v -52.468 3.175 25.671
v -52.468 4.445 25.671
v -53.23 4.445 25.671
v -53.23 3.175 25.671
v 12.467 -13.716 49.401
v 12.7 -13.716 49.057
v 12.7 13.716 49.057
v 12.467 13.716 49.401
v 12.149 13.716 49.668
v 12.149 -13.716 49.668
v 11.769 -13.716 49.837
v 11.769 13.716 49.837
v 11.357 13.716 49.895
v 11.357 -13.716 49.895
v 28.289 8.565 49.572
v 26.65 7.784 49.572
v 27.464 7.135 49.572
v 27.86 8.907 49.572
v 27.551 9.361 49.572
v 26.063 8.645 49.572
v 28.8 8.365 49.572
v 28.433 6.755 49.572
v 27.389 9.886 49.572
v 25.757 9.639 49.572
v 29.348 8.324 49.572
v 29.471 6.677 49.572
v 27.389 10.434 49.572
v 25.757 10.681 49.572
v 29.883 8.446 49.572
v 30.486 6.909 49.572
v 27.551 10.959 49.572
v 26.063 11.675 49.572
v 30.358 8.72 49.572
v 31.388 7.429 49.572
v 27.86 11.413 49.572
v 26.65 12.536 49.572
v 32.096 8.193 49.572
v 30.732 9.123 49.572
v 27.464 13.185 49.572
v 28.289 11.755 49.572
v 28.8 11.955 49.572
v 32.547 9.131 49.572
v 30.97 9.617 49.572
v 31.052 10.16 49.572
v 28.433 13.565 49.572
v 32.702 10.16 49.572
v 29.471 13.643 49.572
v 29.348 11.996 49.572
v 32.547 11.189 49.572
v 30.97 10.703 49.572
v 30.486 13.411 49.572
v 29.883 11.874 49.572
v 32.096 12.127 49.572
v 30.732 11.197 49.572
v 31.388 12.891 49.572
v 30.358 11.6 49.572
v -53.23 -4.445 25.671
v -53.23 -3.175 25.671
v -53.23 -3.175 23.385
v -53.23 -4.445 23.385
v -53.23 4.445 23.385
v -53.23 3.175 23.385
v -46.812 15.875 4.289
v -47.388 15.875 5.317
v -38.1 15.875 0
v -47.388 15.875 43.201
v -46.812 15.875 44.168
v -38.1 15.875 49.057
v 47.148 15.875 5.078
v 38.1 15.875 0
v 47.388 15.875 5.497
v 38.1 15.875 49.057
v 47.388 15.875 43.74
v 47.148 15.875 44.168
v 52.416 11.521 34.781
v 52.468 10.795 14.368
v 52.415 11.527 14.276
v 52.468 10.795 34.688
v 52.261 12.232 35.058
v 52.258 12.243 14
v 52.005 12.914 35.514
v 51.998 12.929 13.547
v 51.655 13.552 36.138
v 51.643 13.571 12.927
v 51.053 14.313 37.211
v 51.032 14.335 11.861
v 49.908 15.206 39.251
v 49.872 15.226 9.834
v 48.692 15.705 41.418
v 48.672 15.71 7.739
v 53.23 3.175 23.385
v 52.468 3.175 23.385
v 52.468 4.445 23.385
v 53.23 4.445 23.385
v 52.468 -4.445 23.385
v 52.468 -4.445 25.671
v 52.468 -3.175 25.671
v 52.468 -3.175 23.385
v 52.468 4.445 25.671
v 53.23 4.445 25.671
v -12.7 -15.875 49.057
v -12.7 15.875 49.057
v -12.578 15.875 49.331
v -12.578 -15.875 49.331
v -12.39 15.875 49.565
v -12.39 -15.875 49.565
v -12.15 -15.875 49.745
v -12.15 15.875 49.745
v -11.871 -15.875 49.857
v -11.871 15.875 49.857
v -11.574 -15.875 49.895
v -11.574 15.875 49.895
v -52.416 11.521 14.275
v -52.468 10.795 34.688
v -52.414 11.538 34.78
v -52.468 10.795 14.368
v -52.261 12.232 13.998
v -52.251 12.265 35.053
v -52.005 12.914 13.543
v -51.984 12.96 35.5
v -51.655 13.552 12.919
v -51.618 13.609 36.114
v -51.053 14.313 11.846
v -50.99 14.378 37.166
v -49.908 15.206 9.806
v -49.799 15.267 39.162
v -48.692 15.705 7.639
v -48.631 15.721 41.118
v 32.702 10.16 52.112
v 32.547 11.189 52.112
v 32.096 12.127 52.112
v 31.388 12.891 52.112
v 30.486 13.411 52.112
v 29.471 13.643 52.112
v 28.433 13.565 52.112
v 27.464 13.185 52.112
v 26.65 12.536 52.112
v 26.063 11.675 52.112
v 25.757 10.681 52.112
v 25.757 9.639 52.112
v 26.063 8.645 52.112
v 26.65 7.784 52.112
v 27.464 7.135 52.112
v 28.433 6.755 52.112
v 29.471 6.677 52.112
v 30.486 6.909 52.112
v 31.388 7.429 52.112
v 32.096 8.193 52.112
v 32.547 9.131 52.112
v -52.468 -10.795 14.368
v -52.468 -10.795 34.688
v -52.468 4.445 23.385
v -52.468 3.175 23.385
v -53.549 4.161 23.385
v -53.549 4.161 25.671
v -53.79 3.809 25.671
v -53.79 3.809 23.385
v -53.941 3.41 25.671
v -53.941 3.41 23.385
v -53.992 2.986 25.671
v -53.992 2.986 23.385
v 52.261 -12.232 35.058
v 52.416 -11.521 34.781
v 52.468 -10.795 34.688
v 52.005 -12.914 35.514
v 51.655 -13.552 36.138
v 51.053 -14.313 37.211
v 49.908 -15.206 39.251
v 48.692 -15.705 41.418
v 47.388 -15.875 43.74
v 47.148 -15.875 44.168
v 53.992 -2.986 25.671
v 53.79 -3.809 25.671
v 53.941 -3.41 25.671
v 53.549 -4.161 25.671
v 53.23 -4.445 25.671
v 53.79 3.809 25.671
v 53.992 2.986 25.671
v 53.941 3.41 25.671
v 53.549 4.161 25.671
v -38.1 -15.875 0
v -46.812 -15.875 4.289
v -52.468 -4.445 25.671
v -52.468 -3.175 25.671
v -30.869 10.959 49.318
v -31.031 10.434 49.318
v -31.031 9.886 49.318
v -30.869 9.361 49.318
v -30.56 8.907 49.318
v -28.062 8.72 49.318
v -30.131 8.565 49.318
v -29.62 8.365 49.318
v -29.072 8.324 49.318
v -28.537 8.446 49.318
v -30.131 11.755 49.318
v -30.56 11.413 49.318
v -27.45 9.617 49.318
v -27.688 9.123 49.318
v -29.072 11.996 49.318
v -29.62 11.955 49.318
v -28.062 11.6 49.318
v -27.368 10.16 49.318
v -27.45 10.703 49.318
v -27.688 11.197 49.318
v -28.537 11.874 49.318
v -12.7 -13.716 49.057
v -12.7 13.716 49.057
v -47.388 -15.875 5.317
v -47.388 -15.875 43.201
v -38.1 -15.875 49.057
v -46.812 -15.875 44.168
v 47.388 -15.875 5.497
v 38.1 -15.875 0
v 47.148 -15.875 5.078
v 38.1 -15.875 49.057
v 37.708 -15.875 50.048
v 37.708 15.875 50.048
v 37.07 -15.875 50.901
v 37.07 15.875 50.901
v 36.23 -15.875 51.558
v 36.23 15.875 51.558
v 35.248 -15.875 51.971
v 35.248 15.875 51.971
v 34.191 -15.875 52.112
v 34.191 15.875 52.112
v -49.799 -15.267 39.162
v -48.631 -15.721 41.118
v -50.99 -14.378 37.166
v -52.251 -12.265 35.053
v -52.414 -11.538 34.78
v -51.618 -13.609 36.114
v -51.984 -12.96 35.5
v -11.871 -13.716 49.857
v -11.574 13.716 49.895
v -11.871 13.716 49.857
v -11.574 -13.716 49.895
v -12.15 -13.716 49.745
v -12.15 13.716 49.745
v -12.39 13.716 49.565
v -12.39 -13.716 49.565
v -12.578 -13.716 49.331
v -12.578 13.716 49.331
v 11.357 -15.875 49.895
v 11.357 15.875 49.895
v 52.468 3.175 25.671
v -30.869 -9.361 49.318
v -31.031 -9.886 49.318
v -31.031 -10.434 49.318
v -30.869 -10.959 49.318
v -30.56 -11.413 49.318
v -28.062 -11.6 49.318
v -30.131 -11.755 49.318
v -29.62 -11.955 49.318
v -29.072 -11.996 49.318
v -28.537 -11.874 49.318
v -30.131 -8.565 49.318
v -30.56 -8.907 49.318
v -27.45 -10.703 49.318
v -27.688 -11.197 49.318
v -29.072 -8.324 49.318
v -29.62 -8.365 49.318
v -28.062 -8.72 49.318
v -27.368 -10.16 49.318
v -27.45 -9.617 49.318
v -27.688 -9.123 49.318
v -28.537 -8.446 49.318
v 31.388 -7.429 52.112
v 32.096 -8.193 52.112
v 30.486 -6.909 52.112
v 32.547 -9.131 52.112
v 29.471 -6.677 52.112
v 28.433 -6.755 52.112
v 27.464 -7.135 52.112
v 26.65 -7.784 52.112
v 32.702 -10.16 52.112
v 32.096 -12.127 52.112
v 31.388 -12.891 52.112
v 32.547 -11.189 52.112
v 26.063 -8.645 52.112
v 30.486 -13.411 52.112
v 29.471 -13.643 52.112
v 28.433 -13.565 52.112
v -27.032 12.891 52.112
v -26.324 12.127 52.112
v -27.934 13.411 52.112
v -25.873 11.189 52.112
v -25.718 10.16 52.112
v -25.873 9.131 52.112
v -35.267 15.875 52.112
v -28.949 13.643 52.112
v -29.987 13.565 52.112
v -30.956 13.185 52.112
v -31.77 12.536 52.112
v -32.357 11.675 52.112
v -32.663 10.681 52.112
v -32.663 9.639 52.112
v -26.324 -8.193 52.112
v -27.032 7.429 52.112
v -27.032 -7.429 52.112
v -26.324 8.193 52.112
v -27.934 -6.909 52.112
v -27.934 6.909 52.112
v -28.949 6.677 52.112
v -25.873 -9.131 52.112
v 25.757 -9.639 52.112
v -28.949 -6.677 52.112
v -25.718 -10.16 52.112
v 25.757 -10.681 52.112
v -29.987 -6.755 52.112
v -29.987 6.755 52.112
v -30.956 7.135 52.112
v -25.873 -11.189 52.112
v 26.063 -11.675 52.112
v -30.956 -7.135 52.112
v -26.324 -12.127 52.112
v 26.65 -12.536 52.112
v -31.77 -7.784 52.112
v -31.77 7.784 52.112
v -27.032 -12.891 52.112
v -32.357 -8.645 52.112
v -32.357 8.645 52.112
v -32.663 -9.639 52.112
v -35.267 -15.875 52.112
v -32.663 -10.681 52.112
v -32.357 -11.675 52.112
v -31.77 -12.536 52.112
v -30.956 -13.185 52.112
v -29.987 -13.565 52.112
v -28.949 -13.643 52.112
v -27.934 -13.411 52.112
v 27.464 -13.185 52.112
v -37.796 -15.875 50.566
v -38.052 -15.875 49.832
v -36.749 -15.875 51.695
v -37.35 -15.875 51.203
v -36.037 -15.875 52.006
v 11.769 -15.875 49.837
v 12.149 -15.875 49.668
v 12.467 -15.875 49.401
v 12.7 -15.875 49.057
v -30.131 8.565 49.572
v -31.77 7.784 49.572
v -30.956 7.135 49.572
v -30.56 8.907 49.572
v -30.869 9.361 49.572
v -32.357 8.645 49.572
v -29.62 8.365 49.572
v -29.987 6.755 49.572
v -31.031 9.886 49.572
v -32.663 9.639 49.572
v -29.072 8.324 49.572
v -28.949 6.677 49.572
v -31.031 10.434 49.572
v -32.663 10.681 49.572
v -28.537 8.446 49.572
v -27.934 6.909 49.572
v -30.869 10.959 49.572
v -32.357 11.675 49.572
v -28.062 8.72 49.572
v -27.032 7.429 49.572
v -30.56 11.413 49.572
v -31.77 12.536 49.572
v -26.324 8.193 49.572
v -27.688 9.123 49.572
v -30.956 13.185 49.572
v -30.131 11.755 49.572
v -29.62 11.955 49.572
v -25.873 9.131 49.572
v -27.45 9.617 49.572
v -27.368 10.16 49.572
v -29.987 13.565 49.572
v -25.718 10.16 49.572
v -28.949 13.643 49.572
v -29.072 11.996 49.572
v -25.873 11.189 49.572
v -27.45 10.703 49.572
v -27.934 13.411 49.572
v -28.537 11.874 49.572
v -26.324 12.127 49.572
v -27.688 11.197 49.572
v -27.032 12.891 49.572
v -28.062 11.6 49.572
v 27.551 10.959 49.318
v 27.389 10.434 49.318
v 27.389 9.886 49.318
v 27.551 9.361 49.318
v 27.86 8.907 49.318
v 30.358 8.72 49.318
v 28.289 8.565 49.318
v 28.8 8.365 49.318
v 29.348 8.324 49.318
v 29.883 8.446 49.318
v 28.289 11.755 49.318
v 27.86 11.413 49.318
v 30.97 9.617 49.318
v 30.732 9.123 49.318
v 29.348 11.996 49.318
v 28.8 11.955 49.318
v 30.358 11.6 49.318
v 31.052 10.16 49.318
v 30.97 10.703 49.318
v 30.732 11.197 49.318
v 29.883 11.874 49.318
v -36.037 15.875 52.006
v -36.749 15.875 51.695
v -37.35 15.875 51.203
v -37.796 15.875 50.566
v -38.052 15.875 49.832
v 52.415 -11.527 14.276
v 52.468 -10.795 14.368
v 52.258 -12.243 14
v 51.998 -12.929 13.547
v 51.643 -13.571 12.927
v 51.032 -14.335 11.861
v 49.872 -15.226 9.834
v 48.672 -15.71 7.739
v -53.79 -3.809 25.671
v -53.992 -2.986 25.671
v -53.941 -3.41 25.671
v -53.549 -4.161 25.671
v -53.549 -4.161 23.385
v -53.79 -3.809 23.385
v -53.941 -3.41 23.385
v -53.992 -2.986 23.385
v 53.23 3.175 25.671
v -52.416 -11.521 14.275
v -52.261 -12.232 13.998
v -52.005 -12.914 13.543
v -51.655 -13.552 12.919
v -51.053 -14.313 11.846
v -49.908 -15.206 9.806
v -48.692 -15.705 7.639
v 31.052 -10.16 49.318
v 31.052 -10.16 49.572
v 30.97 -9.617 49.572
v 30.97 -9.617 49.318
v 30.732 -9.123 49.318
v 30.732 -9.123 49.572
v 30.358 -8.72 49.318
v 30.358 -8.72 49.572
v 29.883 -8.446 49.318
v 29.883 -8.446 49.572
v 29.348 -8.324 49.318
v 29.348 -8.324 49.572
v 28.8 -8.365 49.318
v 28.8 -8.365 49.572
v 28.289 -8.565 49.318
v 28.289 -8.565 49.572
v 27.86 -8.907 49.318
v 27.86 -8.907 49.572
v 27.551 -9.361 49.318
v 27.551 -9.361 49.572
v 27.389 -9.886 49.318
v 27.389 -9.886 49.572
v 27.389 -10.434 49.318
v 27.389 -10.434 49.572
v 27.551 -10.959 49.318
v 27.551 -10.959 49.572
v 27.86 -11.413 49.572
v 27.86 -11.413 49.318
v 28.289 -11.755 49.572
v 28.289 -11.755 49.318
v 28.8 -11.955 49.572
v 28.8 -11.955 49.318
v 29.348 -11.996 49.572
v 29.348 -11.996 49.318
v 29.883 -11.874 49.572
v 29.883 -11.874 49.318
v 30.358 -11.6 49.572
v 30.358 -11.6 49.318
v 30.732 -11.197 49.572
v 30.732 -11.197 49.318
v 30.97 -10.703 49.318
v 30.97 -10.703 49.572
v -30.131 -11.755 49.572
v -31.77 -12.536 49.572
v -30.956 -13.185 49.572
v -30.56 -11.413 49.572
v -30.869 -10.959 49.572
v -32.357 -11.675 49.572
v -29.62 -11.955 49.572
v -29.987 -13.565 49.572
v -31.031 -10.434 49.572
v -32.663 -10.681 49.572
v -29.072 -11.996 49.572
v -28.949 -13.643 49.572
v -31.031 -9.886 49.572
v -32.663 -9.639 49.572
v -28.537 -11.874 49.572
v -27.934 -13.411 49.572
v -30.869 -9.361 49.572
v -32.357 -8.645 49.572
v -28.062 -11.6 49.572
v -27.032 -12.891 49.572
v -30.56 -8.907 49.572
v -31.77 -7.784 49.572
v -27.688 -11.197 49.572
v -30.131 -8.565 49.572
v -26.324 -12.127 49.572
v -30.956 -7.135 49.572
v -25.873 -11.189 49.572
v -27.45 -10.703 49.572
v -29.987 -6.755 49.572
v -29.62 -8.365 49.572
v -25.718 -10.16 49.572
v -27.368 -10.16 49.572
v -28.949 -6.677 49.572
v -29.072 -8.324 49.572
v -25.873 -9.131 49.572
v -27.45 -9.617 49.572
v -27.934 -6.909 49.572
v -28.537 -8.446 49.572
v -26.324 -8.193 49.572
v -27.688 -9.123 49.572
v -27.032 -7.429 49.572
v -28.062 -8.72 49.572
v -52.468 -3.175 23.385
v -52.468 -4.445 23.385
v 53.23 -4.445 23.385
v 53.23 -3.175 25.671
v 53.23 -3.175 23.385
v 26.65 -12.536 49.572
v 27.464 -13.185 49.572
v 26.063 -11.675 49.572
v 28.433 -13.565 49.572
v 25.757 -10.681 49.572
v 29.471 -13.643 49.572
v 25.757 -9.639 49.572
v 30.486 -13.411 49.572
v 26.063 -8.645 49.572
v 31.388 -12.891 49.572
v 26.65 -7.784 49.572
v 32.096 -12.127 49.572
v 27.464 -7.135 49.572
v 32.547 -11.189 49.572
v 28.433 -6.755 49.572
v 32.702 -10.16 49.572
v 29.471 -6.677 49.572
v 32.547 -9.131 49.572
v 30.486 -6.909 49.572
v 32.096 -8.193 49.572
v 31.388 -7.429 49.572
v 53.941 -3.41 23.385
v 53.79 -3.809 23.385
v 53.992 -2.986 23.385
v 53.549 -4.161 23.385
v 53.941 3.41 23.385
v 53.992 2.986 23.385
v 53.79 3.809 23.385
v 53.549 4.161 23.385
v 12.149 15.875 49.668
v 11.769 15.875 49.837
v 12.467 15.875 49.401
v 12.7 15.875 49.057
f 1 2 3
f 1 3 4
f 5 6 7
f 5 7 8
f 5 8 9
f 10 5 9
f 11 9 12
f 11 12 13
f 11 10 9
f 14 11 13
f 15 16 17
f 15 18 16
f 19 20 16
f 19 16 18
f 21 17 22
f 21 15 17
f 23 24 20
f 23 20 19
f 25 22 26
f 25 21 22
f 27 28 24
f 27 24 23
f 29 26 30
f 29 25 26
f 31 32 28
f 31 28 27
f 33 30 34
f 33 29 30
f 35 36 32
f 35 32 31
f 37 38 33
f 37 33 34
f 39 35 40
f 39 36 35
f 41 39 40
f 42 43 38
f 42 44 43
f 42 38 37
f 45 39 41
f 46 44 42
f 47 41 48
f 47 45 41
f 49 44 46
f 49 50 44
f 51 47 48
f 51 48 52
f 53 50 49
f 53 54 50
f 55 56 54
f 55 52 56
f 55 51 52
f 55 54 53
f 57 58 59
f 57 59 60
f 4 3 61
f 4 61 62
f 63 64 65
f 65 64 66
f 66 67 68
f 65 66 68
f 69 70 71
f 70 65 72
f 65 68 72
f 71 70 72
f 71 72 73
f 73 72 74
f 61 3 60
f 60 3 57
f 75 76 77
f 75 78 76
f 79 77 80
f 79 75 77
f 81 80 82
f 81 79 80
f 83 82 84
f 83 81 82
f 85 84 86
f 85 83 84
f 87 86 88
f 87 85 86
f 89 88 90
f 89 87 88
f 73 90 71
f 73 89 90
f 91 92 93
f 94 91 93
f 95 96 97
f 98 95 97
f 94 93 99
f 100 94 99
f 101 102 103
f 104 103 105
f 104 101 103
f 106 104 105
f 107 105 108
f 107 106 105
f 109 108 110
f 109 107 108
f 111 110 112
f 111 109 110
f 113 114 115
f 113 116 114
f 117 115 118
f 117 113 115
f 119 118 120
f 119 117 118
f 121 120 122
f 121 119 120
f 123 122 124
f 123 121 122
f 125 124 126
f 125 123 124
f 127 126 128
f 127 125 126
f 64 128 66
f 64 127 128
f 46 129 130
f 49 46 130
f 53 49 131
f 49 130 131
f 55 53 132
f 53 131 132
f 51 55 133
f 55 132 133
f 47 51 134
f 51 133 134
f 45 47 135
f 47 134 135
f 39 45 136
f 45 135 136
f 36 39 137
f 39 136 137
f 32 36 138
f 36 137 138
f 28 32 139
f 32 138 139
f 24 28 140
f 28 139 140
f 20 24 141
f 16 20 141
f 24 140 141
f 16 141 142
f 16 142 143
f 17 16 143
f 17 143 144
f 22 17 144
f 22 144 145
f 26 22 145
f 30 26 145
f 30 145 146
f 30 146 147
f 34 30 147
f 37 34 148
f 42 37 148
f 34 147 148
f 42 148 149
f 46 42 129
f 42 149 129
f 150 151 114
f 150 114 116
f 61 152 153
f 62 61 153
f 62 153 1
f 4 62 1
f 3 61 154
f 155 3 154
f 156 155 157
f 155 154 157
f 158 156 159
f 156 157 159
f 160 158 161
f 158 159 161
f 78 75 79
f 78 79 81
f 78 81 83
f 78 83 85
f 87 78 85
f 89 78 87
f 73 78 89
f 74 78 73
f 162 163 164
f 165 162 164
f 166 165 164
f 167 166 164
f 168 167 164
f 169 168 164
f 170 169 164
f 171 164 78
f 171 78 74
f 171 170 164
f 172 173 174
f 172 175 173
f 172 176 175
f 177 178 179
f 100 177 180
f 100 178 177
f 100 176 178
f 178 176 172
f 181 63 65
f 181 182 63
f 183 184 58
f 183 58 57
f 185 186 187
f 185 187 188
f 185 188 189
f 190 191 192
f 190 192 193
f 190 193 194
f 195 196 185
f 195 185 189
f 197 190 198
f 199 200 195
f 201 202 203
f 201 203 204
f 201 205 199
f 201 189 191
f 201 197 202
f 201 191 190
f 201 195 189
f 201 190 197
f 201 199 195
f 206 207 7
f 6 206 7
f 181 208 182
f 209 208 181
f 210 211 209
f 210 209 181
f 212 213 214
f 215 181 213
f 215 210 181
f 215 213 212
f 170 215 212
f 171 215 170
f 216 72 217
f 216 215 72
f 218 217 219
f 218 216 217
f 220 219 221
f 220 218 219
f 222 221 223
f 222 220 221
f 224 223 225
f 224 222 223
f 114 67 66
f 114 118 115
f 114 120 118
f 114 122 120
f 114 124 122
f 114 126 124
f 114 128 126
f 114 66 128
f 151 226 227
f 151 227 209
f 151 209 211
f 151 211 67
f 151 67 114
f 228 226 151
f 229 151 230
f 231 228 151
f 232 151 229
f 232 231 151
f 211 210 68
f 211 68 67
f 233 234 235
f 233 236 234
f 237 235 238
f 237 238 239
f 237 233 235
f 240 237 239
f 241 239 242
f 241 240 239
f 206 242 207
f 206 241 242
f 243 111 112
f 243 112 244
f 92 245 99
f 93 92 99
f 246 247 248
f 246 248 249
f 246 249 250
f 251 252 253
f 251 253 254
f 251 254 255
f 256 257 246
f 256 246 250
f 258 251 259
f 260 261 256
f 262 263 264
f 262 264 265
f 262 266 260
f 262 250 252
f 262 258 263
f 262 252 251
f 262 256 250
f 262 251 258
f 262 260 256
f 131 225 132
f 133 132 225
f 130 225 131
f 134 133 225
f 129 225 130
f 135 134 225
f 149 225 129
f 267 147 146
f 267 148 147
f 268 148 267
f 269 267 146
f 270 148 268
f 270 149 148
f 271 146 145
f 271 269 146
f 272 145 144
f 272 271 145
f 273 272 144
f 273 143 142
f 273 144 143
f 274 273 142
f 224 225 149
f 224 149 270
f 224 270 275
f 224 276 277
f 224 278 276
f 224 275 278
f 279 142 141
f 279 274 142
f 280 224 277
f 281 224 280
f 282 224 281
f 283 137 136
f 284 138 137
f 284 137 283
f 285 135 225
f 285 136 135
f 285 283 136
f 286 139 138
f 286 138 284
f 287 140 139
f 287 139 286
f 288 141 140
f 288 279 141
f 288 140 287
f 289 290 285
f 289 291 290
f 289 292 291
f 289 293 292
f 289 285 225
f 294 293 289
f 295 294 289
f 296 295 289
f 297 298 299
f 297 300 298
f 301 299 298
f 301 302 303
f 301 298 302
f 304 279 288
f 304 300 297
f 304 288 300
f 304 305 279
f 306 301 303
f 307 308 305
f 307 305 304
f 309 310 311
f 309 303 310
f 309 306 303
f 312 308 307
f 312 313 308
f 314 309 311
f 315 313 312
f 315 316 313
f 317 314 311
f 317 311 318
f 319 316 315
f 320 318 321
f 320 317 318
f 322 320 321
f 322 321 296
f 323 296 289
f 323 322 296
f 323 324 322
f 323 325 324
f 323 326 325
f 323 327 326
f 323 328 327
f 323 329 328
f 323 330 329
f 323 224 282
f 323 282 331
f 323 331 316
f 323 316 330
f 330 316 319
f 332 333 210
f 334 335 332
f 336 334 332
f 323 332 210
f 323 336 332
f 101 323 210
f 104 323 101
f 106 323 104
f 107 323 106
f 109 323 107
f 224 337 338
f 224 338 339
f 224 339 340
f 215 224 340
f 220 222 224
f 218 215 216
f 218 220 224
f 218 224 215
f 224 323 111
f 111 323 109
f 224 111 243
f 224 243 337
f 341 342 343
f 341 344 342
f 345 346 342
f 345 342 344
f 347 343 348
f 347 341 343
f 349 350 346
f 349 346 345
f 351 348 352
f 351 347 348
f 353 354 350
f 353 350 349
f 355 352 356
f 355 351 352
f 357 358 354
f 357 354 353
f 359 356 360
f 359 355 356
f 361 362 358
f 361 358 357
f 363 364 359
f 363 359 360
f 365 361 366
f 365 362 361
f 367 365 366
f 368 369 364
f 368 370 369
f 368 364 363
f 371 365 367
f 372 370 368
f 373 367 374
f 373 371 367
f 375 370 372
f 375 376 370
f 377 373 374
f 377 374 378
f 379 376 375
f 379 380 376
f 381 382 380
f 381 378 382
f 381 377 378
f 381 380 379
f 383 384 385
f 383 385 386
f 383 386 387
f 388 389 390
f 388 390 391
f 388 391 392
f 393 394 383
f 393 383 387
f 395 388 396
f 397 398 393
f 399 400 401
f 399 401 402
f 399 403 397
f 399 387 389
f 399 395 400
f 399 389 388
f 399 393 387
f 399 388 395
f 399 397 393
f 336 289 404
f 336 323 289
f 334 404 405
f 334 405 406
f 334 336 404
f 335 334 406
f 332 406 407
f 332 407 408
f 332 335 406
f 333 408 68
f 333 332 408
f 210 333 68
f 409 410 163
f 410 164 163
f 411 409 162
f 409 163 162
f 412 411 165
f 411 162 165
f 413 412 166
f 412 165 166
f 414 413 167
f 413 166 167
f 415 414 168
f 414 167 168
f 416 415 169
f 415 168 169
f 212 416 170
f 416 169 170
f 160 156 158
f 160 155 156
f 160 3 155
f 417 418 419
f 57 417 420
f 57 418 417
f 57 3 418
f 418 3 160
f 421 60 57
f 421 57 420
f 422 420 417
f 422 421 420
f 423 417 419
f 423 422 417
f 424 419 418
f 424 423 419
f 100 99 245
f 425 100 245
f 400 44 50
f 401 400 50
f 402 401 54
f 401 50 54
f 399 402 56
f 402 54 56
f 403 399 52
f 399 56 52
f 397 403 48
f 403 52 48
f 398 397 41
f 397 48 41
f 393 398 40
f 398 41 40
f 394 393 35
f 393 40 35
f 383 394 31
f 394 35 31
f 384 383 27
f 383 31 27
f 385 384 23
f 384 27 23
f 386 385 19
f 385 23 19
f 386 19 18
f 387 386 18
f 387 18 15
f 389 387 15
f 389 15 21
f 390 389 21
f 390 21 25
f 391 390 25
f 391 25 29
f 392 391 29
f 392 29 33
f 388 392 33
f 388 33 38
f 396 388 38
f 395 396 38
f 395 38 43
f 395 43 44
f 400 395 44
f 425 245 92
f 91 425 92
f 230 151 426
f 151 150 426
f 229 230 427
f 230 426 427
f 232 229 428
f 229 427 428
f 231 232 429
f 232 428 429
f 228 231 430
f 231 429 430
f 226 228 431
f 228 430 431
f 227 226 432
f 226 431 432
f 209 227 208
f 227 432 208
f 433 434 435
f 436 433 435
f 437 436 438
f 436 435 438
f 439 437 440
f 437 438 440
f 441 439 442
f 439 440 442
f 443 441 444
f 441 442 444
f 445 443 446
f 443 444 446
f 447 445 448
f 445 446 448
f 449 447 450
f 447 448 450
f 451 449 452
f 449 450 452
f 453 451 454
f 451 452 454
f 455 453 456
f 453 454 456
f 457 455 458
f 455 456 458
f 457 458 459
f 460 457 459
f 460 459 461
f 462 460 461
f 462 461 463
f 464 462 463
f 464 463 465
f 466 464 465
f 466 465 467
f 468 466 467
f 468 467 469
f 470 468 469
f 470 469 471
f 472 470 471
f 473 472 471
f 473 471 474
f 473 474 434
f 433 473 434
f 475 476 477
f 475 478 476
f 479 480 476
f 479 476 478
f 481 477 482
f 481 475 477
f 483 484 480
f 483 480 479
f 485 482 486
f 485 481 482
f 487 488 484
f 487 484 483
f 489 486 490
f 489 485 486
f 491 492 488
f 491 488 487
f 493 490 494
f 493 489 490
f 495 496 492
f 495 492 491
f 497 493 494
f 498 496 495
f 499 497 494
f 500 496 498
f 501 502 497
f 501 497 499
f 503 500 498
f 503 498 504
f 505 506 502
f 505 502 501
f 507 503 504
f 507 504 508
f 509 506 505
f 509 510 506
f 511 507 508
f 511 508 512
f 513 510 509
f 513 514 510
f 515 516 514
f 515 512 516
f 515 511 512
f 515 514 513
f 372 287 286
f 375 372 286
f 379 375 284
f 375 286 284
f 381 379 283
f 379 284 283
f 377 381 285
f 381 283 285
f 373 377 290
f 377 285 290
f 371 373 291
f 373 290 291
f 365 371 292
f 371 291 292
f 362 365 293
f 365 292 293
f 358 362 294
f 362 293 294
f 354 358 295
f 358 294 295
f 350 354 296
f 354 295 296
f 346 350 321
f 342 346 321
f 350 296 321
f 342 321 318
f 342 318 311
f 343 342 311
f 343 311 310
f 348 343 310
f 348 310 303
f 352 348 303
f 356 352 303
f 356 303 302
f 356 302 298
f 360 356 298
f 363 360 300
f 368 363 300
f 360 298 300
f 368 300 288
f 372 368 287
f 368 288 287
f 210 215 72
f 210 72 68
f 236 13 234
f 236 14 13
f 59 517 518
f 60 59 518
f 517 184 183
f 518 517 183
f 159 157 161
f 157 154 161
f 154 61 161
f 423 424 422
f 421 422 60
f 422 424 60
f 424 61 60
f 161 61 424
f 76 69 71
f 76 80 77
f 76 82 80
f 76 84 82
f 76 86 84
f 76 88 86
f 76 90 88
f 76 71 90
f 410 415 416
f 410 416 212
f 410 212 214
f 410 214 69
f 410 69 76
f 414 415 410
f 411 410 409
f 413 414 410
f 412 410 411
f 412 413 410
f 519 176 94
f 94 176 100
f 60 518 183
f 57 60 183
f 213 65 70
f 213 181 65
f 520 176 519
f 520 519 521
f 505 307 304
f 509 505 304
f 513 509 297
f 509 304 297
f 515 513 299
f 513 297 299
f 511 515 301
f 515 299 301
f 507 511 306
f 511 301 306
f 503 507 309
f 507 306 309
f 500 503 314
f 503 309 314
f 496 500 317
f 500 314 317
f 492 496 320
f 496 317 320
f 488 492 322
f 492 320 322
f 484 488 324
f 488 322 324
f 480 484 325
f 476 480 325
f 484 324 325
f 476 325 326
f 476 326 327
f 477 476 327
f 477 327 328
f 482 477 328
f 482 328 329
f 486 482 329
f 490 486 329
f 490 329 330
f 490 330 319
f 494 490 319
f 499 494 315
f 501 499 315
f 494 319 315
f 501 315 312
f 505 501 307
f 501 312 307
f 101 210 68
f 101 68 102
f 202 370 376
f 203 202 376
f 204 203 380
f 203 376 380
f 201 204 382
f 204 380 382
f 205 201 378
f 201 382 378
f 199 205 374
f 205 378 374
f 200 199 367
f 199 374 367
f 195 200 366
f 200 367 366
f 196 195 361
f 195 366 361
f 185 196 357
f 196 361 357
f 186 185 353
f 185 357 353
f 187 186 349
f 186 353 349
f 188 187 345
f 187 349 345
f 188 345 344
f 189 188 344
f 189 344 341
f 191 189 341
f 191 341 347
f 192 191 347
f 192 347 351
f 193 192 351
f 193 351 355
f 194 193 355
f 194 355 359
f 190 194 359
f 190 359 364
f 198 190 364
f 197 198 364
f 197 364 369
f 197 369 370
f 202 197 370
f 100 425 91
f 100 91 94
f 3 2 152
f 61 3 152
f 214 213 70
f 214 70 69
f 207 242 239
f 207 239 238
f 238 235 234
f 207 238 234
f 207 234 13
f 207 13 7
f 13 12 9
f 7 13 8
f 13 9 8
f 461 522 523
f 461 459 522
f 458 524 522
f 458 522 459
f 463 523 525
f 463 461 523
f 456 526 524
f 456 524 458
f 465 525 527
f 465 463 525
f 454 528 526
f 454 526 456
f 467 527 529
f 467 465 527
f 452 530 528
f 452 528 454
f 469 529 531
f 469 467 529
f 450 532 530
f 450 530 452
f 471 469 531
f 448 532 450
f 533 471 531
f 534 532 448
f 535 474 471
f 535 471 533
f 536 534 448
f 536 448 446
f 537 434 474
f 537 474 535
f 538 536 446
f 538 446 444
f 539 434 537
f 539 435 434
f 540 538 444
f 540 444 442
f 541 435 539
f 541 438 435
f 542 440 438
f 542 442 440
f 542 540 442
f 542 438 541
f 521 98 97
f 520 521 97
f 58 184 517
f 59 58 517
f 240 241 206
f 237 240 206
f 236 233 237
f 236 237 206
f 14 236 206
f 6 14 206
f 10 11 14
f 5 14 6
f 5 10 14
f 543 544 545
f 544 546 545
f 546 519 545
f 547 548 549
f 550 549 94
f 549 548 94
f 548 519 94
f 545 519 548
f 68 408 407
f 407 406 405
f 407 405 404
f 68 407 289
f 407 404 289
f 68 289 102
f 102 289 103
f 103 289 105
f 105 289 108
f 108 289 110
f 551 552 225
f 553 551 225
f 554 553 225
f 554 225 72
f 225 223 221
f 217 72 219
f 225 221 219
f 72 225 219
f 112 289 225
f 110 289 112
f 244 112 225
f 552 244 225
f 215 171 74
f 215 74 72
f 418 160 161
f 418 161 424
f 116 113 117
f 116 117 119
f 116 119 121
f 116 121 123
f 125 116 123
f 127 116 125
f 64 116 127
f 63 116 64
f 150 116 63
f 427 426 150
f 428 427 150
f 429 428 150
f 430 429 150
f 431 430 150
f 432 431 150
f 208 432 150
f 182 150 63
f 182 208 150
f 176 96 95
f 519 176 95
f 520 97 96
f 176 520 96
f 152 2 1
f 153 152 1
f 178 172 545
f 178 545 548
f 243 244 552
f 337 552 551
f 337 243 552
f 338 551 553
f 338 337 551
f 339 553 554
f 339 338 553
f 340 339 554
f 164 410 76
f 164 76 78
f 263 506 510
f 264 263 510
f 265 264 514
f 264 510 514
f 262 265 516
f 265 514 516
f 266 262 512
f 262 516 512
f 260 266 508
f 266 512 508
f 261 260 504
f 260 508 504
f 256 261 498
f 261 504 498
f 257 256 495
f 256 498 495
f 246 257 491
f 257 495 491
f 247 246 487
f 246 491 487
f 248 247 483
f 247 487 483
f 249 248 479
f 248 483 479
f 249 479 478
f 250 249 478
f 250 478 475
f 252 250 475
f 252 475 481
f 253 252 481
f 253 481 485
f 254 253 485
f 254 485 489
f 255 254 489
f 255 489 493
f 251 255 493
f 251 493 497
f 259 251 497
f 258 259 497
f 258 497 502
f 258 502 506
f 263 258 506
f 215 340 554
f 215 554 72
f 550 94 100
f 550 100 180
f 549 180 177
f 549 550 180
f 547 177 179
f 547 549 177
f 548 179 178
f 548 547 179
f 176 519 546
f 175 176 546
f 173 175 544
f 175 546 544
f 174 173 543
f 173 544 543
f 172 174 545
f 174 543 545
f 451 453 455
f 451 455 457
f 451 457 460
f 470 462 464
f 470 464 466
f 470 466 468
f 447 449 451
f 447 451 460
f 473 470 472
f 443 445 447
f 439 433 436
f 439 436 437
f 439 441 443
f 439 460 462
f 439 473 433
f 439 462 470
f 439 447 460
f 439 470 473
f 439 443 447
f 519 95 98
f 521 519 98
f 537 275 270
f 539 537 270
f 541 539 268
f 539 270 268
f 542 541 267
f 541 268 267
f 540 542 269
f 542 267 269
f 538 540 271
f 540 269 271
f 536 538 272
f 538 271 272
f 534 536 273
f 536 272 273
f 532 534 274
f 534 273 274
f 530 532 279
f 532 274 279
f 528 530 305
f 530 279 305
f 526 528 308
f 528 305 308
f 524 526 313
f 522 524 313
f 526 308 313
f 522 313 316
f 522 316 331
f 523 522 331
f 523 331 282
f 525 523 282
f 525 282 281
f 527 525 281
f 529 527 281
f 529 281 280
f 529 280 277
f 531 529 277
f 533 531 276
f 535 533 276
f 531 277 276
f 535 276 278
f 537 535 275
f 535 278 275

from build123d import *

# Parameters (mm, degrees)
F1_DEPTH       = 15.875
F2_DEPTH       = 15.875
F3_DEPTH       = 13.716
F4_R           = 3.4925
F4_R_2         = 1.8415
F5_DEPTH       = 2.54
F6_DEPTH       = 2.794
F7_W           = 1.27
F7_H           = 1.143
F8_DEPTH       = 0.762
F9_W           = 8.89
F9_H           = 2.286
F10_DEPTH      = 0.762
F11_R          = 5.08
F14_DEPTH      = 0.762
F15_W          = 8.89
F15_H          = 2.286
F16_DEPTH      = 0.762
F17_T1_DEPTH   = 9.5815945611
F17_2_T1_DEPTH = 9.5815945611


# Not quite as in the source:
# - a fillet or chamfer that OpenCascade refuses, or shapes differently, is made with other operations: its cross-section is extruded or revolved along the edge and cut away or added
# - a feature names something its author has since deleted; it is built from what else it names


with BuildPart() as f1:
    # F0 (on Front) → F1 (new body, symmetric)
    with BuildSketch(Plane.XZ):
        Polygon((-52.4684097937, 14.3684097937), (-38.1, 0), (0, 0), (38.1, 0), (52.4684097937, 14.3684097937), (52.4684097937, 34.6884097937), (38.1, 49.0568195874), (12.7, 49.0568195874), (-12.7, 49.0568195874), (-38.1, 49.0568195874), (-52.4684097937, 34.6884097937), align=None)
        Polygon((-46.8117259443, 4.2893581497), (-38.1, 0), (-52.4684097937, 14.3684097937), align=None)
        Polygon((-46.8117259443, 44.167522341), (-52.4684097937, 34.6884097937), (-38.1, 49.0568195874), align=None)
        Polygon((38.1, 49.0568195874), (52.4684097937, 34.6884097937), (47.1484308168, 44.167522341), align=None)
        Polygon((52.4684097937, 14.3684097937), (38.1, 0), (47.1484308168, 5.0782667132), align=None)
    extrude(amount=F1_DEPTH, both=True)

    # F11
    f11_edges = [f1.edges().sort_by_distance(p)[0] for p in [
        (-52.46841, -15.875, 24.52841),
        (-52.46841, 15.875, 24.52841),
        (52.46841, -15.875, 24.52841),
        (52.46841, 15.875, 24.52841),
    ]]
    fillet(f11_edges, radius=F11_R)


with BuildPart() as f2:
    # F0 (on Front) → F2 (new body, symmetric)
    with BuildSketch(Plane.XZ):
        with BuildLine():
            ThreePointArc((-35.2670811117, 52.1118827164), (-37.3502781829, 51.2026079726), (-38.1, 49.0568195874))
            Line((-38.1, 49.0568195874), (-12.7, 49.0568195874))
            ThreePointArc((-12.7, 49.0568195874), (-12.275793737, 49.6626248219), (-11.5737691522, 49.8952455819))
            Line((-11.5737691522, 49.8952455819), (11.3571360707, 49.8952455819))
            ThreePointArc((11.3571360707, 49.8952455819), (12.1486917669, 49.6684286067), (12.7, 49.0568195874))
            Line((12.7, 49.0568195874), (38.1, 49.0568195874))
            ThreePointArc((38.1, 49.0568195874), (36.6717162303, 51.25750972), (34.1911762953, 52.1118827164))
            Line((34.1911762953, 52.1118827164), (-35.2670811117, 52.1118827164))
        make_face()
    extrude(amount=F2_DEPTH, both=True)

    # F4 (on face) → F5 (cut)
    with BuildSketch(Plane.XY.offset(52.1118827164)):
        with Locations((29.21, -10.16)):
            Circle(F4_R)
        with Locations((29.21, -10.16)):
            Circle(F4_R_2, mode=Mode.SUBTRACT)
        with Locations((-29.21, -10.16)):
            Circle(F4_R)
        with Locations((-29.21, -10.16)):
            Circle(F4_R_2, mode=Mode.SUBTRACT)
        with Locations((-29.21, 10.16)):
            Circle(F4_R)
        with Locations((-29.21, 10.16)):
            Circle(F4_R_2, mode=Mode.SUBTRACT)
        with Locations((29.21, 10.16)):
            Circle(F4_R)
        with Locations((29.21, 10.16)):
            Circle(F4_R_2, mode=Mode.SUBTRACT)
    extrude(amount=-F5_DEPTH, mode=Mode.SUBTRACT)

    # F4 (on face) → F6 (cut)
    with BuildSketch(Plane.XY.offset(52.1118827164)):
        with Locations((-29.21, -10.16)):
            Circle(F4_R_2)
        with Locations((29.21, 10.16)):
            Circle(F4_R_2)
        with Locations((29.21, -10.16)):
            Circle(F4_R_2)
        with Locations((-29.21, 10.16)):
            Circle(F4_R_2)
    extrude(amount=-F6_DEPTH, mode=Mode.SUBTRACT)


with BuildPart() as f3:
    # F0 (on Front) → F3 (new body, symmetric)
    with BuildSketch(Plane.XZ):
        with BuildLine():
            ThreePointArc((-11.5737691522, 49.8952455819), (-12.275793737, 49.6626248219), (-12.7, 49.0568195874))
            Line((-12.7, 49.0568195874), (12.7, 49.0568195874))
            ThreePointArc((12.7, 49.0568195874), (12.1486917669, 49.6684286067), (11.3571360707, 49.8952455819))
            Line((11.3571360707, 49.8952455819), (-11.5737691522, 49.8952455819))
        make_face()
    extrude(amount=F3_DEPTH, both=True)


with BuildPart() as f8:
    # F7 (on face) → F8 (new body)
    with BuildSketch(Plane(origin=(-52.4684097937, 0, 0), x_dir=(0, -1, 0), z_dir=(-1, 0, 0))):
        with Locations((-3.81, 25.0999097937)):
            Rectangle(F7_W, F7_H)
        with Locations((-3.81, 23.9569097937)):
            Rectangle(F7_W, F7_H)
    extrude(amount=F8_DEPTH)


with BuildPart() as f8b:
    # F7 (on face) → F8, piece 2 (new body)
    with BuildSketch(Plane(origin=(-52.4684097937, 0, 0), x_dir=(0, -1, 0), z_dir=(-1, 0, 0))):
        with Locations((3.81, 25.0999097937)):
            Rectangle(F7_W, F7_H)
        with Locations((3.81, 23.9569097937)):
            Rectangle(F7_W, F7_H)
    extrude(amount=F8_DEPTH)


with BuildPart() as f10:
    # F9 (on face) → F10 (new body)
    with BuildSketch(Plane(origin=(-53.2304097937, 0, 0), x_dir=(0, -1, 0), z_dir=(-1, 0, 0))):
        with Locations((0, 24.5284097937)):
            Rectangle(F9_W, F9_H)
    extrude(amount=F10_DEPTH)

    # F17: fillet of radius 1.778 on 2 edges, made by hand

    # F17_s2 → F17_t1 (cut)
    with BuildSketch(Plane.XY.offset(19.7376125131)):
        with BuildLine():
            ThreePointArc((-53.2304097937, 4.445), (-53.7904383468, 3.8089351565), (-53.9924097937, 2.9858810878))
            Line((-53.9924097937, 2.9858810878), (-53.9924097937, 4.445))
            Line((-53.9924097937, 4.445), (-53.2304097937, 4.445))
        make_face()
        with BuildLine():
            ThreePointArc((-53.2304097937, -4.445), (-53.7904383468, -3.8089351565), (-53.9924097937, -2.9858810878))
            Line((-53.9924097937, -2.9858810878), (-53.9924097937, -4.445))
            Line((-53.9924097937, -4.445), (-53.2304097937, -4.445))
        make_face()
    extrude(amount=F17_T1_DEPTH, mode=Mode.SUBTRACT)


with BuildPart() as f14:
    # F13 (on face) → F14 (new body)
    with BuildSketch(Plane.YZ.offset(52.4684097937)):
        Polygon((-3.175, 23.3854097937), (-3.175, 24.5284097937), (-3.175, 25.6714097937), (-4.445, 25.6714097937), (-4.445, 23.3854097937), align=None)
    extrude(amount=F14_DEPTH)


with BuildPart() as f14b:
    # F13 (on face) → F14, piece 2 (new body)
    with BuildSketch(Plane.YZ.offset(52.4684097937)):
        Polygon((3.175, 25.6714097937), (3.175, 24.5284097937), (3.175, 23.3854097937), (4.445, 23.3854097937), (4.445, 25.6714097937), align=None)
    extrude(amount=F14_DEPTH)


with BuildPart() as f16:
    # F15 (on face) → F16 (new body)
    with BuildSketch(Plane.YZ.offset(53.2304097937)):
        with Locations((0, 24.5284097937)):
            Rectangle(F15_W, F15_H)
    extrude(amount=F16_DEPTH)

    # F17#2: fillet of radius 1.778 on 2 edges, made by hand

    # F17_2_s2 → F17_2_t1 (cut)
    with BuildSketch(Plane.XY.offset(19.7376125131)):
        with BuildLine():
            ThreePointArc((53.2304097937, -4.445), (53.7904383468, -3.8089351565), (53.9924097937, -2.9858810878))
            Line((53.9924097937, -2.9858810878), (53.9924097937, -4.445))
            Line((53.9924097937, -4.445), (53.2304097937, -4.445))
        make_face()
        with BuildLine():
            ThreePointArc((53.2304097937, 4.445), (53.7904383468, 3.8089351565), (53.9924097937, 2.9858810878))
            Line((53.9924097937, 2.9858810878), (53.9924097937, 4.445))
            Line((53.9924097937, 4.445), (53.2304097937, 4.445))
        make_face()
    extrude(amount=F17_2_T1_DEPTH, mode=Mode.SUBTRACT)


solid = Compound([f1.part, f2.part, f3.part, f8.part, f8b.part, f10.part, f14.part, f14b.part, f16.part])
